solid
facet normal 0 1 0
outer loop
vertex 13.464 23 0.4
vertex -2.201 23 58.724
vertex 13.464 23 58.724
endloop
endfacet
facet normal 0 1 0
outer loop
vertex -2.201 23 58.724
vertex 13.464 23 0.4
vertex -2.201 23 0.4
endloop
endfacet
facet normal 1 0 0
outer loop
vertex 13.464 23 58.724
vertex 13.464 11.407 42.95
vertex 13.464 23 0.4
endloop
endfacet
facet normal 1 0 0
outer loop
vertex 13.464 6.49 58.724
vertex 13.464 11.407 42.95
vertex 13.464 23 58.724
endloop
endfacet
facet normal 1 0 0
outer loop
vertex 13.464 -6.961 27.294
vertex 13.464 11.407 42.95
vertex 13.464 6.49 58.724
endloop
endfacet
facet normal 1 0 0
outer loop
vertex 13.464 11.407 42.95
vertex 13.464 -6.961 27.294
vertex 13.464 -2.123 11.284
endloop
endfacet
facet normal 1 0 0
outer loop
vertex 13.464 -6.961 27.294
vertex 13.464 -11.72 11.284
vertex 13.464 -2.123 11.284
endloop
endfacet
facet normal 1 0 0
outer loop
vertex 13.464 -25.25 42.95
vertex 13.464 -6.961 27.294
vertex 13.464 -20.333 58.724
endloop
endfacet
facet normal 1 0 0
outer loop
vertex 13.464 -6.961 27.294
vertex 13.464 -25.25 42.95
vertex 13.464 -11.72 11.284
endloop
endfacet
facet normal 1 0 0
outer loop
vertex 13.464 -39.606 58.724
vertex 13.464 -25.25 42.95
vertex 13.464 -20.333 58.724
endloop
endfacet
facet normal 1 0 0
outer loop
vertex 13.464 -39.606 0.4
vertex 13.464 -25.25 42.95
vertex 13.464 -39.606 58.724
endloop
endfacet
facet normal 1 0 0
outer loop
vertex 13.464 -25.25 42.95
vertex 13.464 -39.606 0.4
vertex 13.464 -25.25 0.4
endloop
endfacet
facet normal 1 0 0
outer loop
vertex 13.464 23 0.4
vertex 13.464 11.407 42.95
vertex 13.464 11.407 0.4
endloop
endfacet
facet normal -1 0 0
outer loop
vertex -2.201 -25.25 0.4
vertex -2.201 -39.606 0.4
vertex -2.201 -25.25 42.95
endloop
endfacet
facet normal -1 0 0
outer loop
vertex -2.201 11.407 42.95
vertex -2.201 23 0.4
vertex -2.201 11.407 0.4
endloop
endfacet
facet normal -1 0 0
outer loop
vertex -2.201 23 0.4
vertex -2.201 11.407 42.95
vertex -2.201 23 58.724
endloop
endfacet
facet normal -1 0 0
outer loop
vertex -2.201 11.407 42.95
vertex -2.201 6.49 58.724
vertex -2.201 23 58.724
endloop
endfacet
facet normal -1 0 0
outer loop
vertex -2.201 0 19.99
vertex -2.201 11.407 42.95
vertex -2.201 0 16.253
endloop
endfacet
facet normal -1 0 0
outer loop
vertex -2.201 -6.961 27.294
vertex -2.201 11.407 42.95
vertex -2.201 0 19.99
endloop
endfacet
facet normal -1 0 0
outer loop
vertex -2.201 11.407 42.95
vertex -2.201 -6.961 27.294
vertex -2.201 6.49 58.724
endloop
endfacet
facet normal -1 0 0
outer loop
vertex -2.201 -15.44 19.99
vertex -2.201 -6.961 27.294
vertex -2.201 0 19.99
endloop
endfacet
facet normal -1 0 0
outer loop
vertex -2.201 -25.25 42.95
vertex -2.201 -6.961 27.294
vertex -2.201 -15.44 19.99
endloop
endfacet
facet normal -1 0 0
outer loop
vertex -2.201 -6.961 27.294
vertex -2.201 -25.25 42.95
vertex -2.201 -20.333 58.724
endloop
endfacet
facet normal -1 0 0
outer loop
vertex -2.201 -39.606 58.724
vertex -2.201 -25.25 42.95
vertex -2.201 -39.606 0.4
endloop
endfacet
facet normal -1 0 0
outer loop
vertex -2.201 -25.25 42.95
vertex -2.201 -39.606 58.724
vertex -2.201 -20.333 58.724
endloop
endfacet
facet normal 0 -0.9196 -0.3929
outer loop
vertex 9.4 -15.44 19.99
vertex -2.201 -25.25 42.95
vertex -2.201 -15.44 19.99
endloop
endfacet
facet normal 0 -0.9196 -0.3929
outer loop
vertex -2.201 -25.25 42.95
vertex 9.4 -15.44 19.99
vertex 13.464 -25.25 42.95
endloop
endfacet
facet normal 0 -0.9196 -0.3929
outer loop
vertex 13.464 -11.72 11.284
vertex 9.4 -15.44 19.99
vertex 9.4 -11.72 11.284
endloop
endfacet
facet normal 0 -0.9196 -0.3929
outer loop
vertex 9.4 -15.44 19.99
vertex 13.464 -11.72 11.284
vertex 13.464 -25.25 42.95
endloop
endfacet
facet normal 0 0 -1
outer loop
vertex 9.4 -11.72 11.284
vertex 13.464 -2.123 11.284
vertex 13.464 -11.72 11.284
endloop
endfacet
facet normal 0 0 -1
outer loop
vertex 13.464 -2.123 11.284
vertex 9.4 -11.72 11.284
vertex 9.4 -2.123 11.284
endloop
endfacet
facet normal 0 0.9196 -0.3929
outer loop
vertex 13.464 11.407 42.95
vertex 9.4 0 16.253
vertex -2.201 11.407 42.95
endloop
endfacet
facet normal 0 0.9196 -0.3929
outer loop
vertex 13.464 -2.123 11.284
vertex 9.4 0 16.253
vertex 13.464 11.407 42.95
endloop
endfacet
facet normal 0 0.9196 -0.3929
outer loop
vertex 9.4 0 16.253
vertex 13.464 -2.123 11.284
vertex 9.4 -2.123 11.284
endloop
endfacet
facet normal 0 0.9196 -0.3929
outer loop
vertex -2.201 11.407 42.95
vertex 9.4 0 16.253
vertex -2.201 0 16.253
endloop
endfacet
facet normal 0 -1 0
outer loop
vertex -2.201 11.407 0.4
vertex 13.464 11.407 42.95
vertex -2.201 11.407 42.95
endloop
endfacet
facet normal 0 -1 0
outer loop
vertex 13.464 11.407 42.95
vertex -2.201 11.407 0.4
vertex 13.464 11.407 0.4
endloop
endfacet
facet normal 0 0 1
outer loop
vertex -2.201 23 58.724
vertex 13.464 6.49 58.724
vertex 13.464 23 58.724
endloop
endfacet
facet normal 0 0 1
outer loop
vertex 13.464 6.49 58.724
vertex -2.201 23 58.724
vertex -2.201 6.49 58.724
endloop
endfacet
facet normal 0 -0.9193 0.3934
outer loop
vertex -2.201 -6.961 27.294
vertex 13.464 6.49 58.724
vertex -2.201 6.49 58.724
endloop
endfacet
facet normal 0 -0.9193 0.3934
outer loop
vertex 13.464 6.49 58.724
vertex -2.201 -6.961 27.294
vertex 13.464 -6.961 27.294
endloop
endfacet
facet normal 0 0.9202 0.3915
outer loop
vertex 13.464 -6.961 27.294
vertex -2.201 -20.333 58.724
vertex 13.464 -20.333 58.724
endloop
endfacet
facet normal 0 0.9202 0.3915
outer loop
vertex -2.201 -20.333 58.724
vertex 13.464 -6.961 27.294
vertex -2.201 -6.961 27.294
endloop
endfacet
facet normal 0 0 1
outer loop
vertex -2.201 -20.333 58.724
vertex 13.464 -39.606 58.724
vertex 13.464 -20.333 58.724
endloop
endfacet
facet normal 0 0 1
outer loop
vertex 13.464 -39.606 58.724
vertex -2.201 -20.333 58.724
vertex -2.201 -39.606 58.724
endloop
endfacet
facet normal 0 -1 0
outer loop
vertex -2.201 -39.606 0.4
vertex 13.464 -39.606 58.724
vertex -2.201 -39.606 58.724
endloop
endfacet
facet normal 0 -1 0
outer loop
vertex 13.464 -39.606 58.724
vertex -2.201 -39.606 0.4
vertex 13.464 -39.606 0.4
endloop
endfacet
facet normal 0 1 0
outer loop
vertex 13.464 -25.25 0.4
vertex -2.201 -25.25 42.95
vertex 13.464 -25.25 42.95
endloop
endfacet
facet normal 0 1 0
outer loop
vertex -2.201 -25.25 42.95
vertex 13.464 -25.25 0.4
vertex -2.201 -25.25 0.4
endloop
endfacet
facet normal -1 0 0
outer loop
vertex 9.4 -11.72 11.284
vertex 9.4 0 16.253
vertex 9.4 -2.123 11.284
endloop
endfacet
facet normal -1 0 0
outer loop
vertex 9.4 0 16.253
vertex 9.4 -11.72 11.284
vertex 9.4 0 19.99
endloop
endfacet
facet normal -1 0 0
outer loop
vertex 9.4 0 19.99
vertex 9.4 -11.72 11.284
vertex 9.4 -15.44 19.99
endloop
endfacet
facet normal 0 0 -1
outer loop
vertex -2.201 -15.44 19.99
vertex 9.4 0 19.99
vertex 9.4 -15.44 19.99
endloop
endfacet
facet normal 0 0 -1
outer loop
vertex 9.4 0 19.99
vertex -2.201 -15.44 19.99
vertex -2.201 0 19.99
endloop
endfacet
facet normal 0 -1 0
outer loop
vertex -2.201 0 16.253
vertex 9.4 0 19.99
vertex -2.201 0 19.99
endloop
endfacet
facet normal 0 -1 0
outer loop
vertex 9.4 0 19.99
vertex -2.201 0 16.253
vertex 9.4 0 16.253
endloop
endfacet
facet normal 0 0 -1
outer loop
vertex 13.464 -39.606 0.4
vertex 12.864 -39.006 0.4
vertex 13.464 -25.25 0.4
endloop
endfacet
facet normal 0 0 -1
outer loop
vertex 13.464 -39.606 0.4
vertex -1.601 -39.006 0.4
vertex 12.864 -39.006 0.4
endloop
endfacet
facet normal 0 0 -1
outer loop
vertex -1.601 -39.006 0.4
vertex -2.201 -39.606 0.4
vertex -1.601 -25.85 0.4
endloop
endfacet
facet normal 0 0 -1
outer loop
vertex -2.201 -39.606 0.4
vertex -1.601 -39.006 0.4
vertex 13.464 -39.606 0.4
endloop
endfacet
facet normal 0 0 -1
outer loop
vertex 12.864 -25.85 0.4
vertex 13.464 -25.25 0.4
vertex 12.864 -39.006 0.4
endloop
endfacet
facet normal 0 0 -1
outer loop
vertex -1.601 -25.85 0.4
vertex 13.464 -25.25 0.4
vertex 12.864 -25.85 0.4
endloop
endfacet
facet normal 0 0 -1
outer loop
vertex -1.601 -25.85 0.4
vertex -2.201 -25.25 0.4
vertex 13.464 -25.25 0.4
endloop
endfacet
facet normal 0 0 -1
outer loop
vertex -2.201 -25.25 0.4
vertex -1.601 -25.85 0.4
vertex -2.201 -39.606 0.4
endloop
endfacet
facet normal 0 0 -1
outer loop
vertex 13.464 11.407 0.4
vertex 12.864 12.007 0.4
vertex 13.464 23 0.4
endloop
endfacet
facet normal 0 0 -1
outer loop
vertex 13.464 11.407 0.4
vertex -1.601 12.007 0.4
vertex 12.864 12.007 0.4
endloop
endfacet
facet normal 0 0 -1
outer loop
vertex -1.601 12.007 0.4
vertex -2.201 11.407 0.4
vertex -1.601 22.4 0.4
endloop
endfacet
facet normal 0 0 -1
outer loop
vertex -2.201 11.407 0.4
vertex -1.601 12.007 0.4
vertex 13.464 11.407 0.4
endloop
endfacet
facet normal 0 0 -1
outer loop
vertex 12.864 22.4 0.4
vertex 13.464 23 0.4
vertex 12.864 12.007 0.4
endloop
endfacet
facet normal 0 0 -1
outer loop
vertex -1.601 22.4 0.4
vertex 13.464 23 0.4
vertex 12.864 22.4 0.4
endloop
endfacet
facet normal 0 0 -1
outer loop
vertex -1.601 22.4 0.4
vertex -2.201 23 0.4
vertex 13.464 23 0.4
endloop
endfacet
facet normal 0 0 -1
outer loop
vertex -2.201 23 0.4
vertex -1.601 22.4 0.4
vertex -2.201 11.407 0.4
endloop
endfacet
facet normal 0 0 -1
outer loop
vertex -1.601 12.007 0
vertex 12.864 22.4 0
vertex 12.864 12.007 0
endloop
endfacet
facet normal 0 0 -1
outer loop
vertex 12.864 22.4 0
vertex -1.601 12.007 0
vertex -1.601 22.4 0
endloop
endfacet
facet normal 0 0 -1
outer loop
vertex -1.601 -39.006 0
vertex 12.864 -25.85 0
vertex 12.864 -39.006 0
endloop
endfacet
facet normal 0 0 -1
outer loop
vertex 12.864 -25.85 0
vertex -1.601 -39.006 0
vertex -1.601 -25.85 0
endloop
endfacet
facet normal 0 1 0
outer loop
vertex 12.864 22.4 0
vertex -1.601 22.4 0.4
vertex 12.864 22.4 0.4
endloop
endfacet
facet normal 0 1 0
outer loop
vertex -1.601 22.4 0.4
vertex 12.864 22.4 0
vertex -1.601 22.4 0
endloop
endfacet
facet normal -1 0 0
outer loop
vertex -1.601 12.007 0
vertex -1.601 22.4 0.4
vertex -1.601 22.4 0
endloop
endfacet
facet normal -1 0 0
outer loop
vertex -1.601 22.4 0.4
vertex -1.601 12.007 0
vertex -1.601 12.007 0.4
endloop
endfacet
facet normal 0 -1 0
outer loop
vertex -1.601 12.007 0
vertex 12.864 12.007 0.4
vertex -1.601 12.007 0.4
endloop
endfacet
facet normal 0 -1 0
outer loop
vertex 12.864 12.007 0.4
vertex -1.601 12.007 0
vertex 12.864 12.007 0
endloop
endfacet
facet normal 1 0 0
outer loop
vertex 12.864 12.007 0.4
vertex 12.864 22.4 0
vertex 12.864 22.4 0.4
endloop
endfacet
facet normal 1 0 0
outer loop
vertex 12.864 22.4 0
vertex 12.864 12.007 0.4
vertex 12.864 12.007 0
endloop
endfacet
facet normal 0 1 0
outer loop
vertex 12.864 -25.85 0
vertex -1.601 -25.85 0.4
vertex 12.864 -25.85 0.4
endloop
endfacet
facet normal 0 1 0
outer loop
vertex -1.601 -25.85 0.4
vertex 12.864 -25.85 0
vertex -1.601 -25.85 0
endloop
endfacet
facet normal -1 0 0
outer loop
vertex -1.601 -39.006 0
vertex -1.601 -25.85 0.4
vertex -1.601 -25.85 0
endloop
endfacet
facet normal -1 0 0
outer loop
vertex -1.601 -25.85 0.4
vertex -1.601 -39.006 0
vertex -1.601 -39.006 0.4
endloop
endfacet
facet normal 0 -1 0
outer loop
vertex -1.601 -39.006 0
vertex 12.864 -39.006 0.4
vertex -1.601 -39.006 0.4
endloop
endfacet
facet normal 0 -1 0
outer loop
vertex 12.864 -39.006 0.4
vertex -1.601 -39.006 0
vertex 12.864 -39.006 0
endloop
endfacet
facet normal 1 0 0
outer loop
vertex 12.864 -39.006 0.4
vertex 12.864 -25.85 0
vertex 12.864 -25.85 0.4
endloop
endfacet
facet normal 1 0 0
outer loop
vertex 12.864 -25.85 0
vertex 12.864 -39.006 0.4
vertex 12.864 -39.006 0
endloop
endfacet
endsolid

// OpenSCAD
// scale in simplify3d to 60mm height.

$fn=200;

// From thing:2219095. 
module inset_bottom(w=0.4, h=0.2, bounding_size = 200, eps=0.01) {
  if (w == 0 || h < 0) {
    children();
  } else {
    difference() {
      children();
      translate([0, 0, -9*h]) 
          cube([bounding_size, bounding_size, 20*h], center=true);
    }
    linear_extrude(height=h+eps) offset(r = -w) projection(cut=true)
      translate([0, 0, -h/2]) children();
  }
}

module letter1(l) {
 rotate([90, 0, 0]) linear_extrude(height = 100) 
       text(text = l, font = "PT Mono:style=Bold", size = 60);
       //text(text = l, font = "Comic Sans MS:style=Bold", size = 60);
       //text(text = l, font = "Courier:style=Bold", size = 60);
       //text(text = l, font = "Courier New:style=Bold", size = 60);
       //text(text = l, font = "Roboto Mono:style=Bold", size = 60);
}

module letter2(l) {
 rotate([90, 0, 0]) linear_extrude(height = 100) 
       //text(text = l, font = "PT Mono:style=Bold", size = 60);
       //text(text = l, font = "Comic Sans MS:style=Bold", size = 60);
       //text(text = l, font = "Courier:style=Bold", size = 60);
       //text(text = l, font = "Courier New:style=Bold", size = 60);
       //text(text = l, font = "Roboto Mono:style=Bold", size = 60);
  
       text(text = l, font = "Century Gothic:style=Bold", size = 58);
}
     
module main() {
  difference() {
    rotate([0, 0, 0]) translate([-9.85, 23, 0]) 
    intersection() { 
      // A
      letter1("I");
      // B
      translate([-20, -70, 0]) rotate([0, 0, 90]) letter2("M");
    }
    
    translate([-10.6, -20, -0.01]) cube([20, 20, 20]);
    
    translate([20.83, -20, -0.01]) cube([20, 20, 20]);

  }
}


intersection() {
render(convexity = 2)
inset_bottom(w=0.6, h=0.4)
//translate([0, 0, 40.8]) 
 
 
//rotate([-90, 0, 0])
main();

//translate([-0, -24, -1]) #cube([30, 30, 25]);
}
